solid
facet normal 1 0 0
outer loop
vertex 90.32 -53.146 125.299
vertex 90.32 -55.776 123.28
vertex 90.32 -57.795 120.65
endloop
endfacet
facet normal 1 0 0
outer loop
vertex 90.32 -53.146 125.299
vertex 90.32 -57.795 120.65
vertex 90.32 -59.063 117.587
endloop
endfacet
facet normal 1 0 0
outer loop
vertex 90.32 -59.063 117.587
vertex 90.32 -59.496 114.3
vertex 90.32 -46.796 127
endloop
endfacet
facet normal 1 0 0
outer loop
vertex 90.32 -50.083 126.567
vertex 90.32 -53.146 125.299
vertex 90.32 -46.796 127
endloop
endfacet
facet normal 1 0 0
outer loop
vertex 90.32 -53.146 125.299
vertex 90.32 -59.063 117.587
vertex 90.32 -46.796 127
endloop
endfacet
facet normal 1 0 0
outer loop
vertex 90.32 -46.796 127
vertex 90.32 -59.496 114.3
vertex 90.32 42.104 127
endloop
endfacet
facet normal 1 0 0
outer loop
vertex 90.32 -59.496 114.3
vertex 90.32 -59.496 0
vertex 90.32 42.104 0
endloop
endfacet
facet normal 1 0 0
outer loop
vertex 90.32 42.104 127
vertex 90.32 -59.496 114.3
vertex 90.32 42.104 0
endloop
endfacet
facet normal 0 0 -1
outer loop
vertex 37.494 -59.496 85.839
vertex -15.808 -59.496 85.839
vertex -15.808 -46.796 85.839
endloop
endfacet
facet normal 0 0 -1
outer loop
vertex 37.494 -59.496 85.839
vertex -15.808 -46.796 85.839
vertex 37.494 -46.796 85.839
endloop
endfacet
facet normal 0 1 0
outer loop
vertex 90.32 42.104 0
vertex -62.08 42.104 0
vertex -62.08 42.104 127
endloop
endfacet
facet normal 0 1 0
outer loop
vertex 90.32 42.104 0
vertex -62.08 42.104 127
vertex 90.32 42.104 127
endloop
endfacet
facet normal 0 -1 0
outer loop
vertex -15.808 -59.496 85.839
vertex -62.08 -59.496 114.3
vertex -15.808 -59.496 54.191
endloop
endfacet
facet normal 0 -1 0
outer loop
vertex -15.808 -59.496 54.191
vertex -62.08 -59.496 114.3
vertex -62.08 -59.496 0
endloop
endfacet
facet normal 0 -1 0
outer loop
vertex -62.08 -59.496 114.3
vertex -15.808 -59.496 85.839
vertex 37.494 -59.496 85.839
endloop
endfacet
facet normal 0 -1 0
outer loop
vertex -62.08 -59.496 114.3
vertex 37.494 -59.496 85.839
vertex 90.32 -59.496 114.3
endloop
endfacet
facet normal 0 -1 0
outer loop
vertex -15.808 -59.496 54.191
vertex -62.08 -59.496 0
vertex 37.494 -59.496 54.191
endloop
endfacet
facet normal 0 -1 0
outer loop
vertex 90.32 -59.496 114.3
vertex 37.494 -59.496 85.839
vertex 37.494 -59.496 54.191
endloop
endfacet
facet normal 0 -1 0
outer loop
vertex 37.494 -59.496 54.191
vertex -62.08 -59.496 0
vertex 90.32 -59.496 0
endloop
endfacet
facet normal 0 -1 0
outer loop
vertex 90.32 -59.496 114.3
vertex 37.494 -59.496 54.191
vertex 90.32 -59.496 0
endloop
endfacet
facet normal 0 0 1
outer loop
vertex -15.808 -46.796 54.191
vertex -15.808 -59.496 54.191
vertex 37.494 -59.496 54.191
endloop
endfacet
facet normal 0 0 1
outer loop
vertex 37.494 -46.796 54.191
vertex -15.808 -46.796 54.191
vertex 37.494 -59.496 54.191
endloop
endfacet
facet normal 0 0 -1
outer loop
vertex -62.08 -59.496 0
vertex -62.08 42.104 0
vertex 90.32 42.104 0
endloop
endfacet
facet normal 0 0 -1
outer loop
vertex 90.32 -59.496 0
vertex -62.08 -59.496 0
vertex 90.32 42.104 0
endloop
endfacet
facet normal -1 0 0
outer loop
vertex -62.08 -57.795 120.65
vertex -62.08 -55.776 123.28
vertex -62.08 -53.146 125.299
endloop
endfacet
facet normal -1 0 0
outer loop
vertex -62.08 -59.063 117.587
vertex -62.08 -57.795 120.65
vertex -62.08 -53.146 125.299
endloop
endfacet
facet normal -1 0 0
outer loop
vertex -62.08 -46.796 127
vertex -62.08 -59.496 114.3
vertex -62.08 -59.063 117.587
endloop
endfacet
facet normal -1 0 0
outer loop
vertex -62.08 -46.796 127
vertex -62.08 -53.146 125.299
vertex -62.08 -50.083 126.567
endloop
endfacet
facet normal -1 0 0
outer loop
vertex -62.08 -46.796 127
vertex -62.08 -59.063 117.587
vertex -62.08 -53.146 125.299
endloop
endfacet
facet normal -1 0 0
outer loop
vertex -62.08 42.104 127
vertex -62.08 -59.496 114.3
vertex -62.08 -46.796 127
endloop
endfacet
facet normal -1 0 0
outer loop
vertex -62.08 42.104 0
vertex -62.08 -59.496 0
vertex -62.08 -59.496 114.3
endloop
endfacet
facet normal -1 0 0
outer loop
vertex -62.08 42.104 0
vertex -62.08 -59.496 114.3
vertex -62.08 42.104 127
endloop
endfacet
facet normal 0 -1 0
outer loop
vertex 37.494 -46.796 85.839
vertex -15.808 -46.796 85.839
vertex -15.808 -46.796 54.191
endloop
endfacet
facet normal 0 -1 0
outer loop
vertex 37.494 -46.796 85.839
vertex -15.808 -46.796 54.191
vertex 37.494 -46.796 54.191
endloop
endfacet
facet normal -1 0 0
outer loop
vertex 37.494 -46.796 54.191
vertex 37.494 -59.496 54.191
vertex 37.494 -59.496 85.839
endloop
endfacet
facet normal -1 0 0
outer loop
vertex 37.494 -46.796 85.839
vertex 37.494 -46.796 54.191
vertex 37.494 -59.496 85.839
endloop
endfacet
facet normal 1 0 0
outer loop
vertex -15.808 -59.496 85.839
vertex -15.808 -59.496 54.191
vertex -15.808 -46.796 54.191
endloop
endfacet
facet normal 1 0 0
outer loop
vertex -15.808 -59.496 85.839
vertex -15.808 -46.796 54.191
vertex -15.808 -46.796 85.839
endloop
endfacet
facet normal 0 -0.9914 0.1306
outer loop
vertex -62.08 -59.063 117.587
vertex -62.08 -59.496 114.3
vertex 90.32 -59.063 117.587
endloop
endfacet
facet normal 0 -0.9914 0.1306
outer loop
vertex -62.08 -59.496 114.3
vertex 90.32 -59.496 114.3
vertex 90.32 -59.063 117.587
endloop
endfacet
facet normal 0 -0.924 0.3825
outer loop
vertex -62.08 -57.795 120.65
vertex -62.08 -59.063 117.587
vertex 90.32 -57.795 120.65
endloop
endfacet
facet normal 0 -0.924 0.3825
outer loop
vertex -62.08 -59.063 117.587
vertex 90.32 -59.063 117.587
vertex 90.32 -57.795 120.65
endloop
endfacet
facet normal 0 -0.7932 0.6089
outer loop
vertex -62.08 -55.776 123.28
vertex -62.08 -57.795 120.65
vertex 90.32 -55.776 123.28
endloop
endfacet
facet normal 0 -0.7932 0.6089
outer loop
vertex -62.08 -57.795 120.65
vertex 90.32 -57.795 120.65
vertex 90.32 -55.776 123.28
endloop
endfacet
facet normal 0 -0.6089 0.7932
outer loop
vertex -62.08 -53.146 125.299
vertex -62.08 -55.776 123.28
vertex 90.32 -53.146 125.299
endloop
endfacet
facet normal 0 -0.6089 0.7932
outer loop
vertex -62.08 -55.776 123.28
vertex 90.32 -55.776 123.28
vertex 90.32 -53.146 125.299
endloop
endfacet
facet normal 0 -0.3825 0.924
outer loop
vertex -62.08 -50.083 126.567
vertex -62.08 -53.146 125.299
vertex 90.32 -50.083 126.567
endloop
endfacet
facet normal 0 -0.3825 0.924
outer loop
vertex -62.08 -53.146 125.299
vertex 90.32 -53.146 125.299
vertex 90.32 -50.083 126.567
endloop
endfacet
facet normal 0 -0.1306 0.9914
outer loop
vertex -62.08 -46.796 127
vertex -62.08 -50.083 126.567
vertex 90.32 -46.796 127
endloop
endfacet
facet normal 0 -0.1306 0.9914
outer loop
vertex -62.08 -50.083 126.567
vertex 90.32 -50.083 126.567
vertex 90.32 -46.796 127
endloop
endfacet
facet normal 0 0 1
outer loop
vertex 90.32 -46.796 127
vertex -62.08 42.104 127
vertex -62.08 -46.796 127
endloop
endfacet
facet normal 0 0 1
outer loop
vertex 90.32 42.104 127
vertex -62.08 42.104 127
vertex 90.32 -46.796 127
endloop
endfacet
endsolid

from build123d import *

# Parameters (mm, degrees)
F0_W     = 152.4
F0_H     = 101.6
F1_DEPTH = 127
F2_R     = 12.7
F3_W     = 53.302623
F3_H     = 31.648196
F4_DEPTH = 12.7


with BuildPart() as f1:
    # F0 (on Top) → F1 (new body)
    with BuildSketch(Plane.XY):
        with Locations((14.119559, -8.696024)):
            Rectangle(F0_W, F0_H)
    extrude(amount=F1_DEPTH)

    # F2
    f2_edges = [f1.edges().sort_by_distance(p)[0] for p in [
        (14.119559, -59.496024, 127),
    ]]
    fillet(f2_edges, radius=F2_R)

    # F3 (on face) → F4 (cut)
    with BuildSketch(Plane.XZ.offset(59.496024)):
        with Locations((10.842934, 70.015054)):
            Rectangle(F3_W, F3_H)
    extrude(amount=-F4_DEPTH, mode=Mode.SUBTRACT)


solid = f1.part
